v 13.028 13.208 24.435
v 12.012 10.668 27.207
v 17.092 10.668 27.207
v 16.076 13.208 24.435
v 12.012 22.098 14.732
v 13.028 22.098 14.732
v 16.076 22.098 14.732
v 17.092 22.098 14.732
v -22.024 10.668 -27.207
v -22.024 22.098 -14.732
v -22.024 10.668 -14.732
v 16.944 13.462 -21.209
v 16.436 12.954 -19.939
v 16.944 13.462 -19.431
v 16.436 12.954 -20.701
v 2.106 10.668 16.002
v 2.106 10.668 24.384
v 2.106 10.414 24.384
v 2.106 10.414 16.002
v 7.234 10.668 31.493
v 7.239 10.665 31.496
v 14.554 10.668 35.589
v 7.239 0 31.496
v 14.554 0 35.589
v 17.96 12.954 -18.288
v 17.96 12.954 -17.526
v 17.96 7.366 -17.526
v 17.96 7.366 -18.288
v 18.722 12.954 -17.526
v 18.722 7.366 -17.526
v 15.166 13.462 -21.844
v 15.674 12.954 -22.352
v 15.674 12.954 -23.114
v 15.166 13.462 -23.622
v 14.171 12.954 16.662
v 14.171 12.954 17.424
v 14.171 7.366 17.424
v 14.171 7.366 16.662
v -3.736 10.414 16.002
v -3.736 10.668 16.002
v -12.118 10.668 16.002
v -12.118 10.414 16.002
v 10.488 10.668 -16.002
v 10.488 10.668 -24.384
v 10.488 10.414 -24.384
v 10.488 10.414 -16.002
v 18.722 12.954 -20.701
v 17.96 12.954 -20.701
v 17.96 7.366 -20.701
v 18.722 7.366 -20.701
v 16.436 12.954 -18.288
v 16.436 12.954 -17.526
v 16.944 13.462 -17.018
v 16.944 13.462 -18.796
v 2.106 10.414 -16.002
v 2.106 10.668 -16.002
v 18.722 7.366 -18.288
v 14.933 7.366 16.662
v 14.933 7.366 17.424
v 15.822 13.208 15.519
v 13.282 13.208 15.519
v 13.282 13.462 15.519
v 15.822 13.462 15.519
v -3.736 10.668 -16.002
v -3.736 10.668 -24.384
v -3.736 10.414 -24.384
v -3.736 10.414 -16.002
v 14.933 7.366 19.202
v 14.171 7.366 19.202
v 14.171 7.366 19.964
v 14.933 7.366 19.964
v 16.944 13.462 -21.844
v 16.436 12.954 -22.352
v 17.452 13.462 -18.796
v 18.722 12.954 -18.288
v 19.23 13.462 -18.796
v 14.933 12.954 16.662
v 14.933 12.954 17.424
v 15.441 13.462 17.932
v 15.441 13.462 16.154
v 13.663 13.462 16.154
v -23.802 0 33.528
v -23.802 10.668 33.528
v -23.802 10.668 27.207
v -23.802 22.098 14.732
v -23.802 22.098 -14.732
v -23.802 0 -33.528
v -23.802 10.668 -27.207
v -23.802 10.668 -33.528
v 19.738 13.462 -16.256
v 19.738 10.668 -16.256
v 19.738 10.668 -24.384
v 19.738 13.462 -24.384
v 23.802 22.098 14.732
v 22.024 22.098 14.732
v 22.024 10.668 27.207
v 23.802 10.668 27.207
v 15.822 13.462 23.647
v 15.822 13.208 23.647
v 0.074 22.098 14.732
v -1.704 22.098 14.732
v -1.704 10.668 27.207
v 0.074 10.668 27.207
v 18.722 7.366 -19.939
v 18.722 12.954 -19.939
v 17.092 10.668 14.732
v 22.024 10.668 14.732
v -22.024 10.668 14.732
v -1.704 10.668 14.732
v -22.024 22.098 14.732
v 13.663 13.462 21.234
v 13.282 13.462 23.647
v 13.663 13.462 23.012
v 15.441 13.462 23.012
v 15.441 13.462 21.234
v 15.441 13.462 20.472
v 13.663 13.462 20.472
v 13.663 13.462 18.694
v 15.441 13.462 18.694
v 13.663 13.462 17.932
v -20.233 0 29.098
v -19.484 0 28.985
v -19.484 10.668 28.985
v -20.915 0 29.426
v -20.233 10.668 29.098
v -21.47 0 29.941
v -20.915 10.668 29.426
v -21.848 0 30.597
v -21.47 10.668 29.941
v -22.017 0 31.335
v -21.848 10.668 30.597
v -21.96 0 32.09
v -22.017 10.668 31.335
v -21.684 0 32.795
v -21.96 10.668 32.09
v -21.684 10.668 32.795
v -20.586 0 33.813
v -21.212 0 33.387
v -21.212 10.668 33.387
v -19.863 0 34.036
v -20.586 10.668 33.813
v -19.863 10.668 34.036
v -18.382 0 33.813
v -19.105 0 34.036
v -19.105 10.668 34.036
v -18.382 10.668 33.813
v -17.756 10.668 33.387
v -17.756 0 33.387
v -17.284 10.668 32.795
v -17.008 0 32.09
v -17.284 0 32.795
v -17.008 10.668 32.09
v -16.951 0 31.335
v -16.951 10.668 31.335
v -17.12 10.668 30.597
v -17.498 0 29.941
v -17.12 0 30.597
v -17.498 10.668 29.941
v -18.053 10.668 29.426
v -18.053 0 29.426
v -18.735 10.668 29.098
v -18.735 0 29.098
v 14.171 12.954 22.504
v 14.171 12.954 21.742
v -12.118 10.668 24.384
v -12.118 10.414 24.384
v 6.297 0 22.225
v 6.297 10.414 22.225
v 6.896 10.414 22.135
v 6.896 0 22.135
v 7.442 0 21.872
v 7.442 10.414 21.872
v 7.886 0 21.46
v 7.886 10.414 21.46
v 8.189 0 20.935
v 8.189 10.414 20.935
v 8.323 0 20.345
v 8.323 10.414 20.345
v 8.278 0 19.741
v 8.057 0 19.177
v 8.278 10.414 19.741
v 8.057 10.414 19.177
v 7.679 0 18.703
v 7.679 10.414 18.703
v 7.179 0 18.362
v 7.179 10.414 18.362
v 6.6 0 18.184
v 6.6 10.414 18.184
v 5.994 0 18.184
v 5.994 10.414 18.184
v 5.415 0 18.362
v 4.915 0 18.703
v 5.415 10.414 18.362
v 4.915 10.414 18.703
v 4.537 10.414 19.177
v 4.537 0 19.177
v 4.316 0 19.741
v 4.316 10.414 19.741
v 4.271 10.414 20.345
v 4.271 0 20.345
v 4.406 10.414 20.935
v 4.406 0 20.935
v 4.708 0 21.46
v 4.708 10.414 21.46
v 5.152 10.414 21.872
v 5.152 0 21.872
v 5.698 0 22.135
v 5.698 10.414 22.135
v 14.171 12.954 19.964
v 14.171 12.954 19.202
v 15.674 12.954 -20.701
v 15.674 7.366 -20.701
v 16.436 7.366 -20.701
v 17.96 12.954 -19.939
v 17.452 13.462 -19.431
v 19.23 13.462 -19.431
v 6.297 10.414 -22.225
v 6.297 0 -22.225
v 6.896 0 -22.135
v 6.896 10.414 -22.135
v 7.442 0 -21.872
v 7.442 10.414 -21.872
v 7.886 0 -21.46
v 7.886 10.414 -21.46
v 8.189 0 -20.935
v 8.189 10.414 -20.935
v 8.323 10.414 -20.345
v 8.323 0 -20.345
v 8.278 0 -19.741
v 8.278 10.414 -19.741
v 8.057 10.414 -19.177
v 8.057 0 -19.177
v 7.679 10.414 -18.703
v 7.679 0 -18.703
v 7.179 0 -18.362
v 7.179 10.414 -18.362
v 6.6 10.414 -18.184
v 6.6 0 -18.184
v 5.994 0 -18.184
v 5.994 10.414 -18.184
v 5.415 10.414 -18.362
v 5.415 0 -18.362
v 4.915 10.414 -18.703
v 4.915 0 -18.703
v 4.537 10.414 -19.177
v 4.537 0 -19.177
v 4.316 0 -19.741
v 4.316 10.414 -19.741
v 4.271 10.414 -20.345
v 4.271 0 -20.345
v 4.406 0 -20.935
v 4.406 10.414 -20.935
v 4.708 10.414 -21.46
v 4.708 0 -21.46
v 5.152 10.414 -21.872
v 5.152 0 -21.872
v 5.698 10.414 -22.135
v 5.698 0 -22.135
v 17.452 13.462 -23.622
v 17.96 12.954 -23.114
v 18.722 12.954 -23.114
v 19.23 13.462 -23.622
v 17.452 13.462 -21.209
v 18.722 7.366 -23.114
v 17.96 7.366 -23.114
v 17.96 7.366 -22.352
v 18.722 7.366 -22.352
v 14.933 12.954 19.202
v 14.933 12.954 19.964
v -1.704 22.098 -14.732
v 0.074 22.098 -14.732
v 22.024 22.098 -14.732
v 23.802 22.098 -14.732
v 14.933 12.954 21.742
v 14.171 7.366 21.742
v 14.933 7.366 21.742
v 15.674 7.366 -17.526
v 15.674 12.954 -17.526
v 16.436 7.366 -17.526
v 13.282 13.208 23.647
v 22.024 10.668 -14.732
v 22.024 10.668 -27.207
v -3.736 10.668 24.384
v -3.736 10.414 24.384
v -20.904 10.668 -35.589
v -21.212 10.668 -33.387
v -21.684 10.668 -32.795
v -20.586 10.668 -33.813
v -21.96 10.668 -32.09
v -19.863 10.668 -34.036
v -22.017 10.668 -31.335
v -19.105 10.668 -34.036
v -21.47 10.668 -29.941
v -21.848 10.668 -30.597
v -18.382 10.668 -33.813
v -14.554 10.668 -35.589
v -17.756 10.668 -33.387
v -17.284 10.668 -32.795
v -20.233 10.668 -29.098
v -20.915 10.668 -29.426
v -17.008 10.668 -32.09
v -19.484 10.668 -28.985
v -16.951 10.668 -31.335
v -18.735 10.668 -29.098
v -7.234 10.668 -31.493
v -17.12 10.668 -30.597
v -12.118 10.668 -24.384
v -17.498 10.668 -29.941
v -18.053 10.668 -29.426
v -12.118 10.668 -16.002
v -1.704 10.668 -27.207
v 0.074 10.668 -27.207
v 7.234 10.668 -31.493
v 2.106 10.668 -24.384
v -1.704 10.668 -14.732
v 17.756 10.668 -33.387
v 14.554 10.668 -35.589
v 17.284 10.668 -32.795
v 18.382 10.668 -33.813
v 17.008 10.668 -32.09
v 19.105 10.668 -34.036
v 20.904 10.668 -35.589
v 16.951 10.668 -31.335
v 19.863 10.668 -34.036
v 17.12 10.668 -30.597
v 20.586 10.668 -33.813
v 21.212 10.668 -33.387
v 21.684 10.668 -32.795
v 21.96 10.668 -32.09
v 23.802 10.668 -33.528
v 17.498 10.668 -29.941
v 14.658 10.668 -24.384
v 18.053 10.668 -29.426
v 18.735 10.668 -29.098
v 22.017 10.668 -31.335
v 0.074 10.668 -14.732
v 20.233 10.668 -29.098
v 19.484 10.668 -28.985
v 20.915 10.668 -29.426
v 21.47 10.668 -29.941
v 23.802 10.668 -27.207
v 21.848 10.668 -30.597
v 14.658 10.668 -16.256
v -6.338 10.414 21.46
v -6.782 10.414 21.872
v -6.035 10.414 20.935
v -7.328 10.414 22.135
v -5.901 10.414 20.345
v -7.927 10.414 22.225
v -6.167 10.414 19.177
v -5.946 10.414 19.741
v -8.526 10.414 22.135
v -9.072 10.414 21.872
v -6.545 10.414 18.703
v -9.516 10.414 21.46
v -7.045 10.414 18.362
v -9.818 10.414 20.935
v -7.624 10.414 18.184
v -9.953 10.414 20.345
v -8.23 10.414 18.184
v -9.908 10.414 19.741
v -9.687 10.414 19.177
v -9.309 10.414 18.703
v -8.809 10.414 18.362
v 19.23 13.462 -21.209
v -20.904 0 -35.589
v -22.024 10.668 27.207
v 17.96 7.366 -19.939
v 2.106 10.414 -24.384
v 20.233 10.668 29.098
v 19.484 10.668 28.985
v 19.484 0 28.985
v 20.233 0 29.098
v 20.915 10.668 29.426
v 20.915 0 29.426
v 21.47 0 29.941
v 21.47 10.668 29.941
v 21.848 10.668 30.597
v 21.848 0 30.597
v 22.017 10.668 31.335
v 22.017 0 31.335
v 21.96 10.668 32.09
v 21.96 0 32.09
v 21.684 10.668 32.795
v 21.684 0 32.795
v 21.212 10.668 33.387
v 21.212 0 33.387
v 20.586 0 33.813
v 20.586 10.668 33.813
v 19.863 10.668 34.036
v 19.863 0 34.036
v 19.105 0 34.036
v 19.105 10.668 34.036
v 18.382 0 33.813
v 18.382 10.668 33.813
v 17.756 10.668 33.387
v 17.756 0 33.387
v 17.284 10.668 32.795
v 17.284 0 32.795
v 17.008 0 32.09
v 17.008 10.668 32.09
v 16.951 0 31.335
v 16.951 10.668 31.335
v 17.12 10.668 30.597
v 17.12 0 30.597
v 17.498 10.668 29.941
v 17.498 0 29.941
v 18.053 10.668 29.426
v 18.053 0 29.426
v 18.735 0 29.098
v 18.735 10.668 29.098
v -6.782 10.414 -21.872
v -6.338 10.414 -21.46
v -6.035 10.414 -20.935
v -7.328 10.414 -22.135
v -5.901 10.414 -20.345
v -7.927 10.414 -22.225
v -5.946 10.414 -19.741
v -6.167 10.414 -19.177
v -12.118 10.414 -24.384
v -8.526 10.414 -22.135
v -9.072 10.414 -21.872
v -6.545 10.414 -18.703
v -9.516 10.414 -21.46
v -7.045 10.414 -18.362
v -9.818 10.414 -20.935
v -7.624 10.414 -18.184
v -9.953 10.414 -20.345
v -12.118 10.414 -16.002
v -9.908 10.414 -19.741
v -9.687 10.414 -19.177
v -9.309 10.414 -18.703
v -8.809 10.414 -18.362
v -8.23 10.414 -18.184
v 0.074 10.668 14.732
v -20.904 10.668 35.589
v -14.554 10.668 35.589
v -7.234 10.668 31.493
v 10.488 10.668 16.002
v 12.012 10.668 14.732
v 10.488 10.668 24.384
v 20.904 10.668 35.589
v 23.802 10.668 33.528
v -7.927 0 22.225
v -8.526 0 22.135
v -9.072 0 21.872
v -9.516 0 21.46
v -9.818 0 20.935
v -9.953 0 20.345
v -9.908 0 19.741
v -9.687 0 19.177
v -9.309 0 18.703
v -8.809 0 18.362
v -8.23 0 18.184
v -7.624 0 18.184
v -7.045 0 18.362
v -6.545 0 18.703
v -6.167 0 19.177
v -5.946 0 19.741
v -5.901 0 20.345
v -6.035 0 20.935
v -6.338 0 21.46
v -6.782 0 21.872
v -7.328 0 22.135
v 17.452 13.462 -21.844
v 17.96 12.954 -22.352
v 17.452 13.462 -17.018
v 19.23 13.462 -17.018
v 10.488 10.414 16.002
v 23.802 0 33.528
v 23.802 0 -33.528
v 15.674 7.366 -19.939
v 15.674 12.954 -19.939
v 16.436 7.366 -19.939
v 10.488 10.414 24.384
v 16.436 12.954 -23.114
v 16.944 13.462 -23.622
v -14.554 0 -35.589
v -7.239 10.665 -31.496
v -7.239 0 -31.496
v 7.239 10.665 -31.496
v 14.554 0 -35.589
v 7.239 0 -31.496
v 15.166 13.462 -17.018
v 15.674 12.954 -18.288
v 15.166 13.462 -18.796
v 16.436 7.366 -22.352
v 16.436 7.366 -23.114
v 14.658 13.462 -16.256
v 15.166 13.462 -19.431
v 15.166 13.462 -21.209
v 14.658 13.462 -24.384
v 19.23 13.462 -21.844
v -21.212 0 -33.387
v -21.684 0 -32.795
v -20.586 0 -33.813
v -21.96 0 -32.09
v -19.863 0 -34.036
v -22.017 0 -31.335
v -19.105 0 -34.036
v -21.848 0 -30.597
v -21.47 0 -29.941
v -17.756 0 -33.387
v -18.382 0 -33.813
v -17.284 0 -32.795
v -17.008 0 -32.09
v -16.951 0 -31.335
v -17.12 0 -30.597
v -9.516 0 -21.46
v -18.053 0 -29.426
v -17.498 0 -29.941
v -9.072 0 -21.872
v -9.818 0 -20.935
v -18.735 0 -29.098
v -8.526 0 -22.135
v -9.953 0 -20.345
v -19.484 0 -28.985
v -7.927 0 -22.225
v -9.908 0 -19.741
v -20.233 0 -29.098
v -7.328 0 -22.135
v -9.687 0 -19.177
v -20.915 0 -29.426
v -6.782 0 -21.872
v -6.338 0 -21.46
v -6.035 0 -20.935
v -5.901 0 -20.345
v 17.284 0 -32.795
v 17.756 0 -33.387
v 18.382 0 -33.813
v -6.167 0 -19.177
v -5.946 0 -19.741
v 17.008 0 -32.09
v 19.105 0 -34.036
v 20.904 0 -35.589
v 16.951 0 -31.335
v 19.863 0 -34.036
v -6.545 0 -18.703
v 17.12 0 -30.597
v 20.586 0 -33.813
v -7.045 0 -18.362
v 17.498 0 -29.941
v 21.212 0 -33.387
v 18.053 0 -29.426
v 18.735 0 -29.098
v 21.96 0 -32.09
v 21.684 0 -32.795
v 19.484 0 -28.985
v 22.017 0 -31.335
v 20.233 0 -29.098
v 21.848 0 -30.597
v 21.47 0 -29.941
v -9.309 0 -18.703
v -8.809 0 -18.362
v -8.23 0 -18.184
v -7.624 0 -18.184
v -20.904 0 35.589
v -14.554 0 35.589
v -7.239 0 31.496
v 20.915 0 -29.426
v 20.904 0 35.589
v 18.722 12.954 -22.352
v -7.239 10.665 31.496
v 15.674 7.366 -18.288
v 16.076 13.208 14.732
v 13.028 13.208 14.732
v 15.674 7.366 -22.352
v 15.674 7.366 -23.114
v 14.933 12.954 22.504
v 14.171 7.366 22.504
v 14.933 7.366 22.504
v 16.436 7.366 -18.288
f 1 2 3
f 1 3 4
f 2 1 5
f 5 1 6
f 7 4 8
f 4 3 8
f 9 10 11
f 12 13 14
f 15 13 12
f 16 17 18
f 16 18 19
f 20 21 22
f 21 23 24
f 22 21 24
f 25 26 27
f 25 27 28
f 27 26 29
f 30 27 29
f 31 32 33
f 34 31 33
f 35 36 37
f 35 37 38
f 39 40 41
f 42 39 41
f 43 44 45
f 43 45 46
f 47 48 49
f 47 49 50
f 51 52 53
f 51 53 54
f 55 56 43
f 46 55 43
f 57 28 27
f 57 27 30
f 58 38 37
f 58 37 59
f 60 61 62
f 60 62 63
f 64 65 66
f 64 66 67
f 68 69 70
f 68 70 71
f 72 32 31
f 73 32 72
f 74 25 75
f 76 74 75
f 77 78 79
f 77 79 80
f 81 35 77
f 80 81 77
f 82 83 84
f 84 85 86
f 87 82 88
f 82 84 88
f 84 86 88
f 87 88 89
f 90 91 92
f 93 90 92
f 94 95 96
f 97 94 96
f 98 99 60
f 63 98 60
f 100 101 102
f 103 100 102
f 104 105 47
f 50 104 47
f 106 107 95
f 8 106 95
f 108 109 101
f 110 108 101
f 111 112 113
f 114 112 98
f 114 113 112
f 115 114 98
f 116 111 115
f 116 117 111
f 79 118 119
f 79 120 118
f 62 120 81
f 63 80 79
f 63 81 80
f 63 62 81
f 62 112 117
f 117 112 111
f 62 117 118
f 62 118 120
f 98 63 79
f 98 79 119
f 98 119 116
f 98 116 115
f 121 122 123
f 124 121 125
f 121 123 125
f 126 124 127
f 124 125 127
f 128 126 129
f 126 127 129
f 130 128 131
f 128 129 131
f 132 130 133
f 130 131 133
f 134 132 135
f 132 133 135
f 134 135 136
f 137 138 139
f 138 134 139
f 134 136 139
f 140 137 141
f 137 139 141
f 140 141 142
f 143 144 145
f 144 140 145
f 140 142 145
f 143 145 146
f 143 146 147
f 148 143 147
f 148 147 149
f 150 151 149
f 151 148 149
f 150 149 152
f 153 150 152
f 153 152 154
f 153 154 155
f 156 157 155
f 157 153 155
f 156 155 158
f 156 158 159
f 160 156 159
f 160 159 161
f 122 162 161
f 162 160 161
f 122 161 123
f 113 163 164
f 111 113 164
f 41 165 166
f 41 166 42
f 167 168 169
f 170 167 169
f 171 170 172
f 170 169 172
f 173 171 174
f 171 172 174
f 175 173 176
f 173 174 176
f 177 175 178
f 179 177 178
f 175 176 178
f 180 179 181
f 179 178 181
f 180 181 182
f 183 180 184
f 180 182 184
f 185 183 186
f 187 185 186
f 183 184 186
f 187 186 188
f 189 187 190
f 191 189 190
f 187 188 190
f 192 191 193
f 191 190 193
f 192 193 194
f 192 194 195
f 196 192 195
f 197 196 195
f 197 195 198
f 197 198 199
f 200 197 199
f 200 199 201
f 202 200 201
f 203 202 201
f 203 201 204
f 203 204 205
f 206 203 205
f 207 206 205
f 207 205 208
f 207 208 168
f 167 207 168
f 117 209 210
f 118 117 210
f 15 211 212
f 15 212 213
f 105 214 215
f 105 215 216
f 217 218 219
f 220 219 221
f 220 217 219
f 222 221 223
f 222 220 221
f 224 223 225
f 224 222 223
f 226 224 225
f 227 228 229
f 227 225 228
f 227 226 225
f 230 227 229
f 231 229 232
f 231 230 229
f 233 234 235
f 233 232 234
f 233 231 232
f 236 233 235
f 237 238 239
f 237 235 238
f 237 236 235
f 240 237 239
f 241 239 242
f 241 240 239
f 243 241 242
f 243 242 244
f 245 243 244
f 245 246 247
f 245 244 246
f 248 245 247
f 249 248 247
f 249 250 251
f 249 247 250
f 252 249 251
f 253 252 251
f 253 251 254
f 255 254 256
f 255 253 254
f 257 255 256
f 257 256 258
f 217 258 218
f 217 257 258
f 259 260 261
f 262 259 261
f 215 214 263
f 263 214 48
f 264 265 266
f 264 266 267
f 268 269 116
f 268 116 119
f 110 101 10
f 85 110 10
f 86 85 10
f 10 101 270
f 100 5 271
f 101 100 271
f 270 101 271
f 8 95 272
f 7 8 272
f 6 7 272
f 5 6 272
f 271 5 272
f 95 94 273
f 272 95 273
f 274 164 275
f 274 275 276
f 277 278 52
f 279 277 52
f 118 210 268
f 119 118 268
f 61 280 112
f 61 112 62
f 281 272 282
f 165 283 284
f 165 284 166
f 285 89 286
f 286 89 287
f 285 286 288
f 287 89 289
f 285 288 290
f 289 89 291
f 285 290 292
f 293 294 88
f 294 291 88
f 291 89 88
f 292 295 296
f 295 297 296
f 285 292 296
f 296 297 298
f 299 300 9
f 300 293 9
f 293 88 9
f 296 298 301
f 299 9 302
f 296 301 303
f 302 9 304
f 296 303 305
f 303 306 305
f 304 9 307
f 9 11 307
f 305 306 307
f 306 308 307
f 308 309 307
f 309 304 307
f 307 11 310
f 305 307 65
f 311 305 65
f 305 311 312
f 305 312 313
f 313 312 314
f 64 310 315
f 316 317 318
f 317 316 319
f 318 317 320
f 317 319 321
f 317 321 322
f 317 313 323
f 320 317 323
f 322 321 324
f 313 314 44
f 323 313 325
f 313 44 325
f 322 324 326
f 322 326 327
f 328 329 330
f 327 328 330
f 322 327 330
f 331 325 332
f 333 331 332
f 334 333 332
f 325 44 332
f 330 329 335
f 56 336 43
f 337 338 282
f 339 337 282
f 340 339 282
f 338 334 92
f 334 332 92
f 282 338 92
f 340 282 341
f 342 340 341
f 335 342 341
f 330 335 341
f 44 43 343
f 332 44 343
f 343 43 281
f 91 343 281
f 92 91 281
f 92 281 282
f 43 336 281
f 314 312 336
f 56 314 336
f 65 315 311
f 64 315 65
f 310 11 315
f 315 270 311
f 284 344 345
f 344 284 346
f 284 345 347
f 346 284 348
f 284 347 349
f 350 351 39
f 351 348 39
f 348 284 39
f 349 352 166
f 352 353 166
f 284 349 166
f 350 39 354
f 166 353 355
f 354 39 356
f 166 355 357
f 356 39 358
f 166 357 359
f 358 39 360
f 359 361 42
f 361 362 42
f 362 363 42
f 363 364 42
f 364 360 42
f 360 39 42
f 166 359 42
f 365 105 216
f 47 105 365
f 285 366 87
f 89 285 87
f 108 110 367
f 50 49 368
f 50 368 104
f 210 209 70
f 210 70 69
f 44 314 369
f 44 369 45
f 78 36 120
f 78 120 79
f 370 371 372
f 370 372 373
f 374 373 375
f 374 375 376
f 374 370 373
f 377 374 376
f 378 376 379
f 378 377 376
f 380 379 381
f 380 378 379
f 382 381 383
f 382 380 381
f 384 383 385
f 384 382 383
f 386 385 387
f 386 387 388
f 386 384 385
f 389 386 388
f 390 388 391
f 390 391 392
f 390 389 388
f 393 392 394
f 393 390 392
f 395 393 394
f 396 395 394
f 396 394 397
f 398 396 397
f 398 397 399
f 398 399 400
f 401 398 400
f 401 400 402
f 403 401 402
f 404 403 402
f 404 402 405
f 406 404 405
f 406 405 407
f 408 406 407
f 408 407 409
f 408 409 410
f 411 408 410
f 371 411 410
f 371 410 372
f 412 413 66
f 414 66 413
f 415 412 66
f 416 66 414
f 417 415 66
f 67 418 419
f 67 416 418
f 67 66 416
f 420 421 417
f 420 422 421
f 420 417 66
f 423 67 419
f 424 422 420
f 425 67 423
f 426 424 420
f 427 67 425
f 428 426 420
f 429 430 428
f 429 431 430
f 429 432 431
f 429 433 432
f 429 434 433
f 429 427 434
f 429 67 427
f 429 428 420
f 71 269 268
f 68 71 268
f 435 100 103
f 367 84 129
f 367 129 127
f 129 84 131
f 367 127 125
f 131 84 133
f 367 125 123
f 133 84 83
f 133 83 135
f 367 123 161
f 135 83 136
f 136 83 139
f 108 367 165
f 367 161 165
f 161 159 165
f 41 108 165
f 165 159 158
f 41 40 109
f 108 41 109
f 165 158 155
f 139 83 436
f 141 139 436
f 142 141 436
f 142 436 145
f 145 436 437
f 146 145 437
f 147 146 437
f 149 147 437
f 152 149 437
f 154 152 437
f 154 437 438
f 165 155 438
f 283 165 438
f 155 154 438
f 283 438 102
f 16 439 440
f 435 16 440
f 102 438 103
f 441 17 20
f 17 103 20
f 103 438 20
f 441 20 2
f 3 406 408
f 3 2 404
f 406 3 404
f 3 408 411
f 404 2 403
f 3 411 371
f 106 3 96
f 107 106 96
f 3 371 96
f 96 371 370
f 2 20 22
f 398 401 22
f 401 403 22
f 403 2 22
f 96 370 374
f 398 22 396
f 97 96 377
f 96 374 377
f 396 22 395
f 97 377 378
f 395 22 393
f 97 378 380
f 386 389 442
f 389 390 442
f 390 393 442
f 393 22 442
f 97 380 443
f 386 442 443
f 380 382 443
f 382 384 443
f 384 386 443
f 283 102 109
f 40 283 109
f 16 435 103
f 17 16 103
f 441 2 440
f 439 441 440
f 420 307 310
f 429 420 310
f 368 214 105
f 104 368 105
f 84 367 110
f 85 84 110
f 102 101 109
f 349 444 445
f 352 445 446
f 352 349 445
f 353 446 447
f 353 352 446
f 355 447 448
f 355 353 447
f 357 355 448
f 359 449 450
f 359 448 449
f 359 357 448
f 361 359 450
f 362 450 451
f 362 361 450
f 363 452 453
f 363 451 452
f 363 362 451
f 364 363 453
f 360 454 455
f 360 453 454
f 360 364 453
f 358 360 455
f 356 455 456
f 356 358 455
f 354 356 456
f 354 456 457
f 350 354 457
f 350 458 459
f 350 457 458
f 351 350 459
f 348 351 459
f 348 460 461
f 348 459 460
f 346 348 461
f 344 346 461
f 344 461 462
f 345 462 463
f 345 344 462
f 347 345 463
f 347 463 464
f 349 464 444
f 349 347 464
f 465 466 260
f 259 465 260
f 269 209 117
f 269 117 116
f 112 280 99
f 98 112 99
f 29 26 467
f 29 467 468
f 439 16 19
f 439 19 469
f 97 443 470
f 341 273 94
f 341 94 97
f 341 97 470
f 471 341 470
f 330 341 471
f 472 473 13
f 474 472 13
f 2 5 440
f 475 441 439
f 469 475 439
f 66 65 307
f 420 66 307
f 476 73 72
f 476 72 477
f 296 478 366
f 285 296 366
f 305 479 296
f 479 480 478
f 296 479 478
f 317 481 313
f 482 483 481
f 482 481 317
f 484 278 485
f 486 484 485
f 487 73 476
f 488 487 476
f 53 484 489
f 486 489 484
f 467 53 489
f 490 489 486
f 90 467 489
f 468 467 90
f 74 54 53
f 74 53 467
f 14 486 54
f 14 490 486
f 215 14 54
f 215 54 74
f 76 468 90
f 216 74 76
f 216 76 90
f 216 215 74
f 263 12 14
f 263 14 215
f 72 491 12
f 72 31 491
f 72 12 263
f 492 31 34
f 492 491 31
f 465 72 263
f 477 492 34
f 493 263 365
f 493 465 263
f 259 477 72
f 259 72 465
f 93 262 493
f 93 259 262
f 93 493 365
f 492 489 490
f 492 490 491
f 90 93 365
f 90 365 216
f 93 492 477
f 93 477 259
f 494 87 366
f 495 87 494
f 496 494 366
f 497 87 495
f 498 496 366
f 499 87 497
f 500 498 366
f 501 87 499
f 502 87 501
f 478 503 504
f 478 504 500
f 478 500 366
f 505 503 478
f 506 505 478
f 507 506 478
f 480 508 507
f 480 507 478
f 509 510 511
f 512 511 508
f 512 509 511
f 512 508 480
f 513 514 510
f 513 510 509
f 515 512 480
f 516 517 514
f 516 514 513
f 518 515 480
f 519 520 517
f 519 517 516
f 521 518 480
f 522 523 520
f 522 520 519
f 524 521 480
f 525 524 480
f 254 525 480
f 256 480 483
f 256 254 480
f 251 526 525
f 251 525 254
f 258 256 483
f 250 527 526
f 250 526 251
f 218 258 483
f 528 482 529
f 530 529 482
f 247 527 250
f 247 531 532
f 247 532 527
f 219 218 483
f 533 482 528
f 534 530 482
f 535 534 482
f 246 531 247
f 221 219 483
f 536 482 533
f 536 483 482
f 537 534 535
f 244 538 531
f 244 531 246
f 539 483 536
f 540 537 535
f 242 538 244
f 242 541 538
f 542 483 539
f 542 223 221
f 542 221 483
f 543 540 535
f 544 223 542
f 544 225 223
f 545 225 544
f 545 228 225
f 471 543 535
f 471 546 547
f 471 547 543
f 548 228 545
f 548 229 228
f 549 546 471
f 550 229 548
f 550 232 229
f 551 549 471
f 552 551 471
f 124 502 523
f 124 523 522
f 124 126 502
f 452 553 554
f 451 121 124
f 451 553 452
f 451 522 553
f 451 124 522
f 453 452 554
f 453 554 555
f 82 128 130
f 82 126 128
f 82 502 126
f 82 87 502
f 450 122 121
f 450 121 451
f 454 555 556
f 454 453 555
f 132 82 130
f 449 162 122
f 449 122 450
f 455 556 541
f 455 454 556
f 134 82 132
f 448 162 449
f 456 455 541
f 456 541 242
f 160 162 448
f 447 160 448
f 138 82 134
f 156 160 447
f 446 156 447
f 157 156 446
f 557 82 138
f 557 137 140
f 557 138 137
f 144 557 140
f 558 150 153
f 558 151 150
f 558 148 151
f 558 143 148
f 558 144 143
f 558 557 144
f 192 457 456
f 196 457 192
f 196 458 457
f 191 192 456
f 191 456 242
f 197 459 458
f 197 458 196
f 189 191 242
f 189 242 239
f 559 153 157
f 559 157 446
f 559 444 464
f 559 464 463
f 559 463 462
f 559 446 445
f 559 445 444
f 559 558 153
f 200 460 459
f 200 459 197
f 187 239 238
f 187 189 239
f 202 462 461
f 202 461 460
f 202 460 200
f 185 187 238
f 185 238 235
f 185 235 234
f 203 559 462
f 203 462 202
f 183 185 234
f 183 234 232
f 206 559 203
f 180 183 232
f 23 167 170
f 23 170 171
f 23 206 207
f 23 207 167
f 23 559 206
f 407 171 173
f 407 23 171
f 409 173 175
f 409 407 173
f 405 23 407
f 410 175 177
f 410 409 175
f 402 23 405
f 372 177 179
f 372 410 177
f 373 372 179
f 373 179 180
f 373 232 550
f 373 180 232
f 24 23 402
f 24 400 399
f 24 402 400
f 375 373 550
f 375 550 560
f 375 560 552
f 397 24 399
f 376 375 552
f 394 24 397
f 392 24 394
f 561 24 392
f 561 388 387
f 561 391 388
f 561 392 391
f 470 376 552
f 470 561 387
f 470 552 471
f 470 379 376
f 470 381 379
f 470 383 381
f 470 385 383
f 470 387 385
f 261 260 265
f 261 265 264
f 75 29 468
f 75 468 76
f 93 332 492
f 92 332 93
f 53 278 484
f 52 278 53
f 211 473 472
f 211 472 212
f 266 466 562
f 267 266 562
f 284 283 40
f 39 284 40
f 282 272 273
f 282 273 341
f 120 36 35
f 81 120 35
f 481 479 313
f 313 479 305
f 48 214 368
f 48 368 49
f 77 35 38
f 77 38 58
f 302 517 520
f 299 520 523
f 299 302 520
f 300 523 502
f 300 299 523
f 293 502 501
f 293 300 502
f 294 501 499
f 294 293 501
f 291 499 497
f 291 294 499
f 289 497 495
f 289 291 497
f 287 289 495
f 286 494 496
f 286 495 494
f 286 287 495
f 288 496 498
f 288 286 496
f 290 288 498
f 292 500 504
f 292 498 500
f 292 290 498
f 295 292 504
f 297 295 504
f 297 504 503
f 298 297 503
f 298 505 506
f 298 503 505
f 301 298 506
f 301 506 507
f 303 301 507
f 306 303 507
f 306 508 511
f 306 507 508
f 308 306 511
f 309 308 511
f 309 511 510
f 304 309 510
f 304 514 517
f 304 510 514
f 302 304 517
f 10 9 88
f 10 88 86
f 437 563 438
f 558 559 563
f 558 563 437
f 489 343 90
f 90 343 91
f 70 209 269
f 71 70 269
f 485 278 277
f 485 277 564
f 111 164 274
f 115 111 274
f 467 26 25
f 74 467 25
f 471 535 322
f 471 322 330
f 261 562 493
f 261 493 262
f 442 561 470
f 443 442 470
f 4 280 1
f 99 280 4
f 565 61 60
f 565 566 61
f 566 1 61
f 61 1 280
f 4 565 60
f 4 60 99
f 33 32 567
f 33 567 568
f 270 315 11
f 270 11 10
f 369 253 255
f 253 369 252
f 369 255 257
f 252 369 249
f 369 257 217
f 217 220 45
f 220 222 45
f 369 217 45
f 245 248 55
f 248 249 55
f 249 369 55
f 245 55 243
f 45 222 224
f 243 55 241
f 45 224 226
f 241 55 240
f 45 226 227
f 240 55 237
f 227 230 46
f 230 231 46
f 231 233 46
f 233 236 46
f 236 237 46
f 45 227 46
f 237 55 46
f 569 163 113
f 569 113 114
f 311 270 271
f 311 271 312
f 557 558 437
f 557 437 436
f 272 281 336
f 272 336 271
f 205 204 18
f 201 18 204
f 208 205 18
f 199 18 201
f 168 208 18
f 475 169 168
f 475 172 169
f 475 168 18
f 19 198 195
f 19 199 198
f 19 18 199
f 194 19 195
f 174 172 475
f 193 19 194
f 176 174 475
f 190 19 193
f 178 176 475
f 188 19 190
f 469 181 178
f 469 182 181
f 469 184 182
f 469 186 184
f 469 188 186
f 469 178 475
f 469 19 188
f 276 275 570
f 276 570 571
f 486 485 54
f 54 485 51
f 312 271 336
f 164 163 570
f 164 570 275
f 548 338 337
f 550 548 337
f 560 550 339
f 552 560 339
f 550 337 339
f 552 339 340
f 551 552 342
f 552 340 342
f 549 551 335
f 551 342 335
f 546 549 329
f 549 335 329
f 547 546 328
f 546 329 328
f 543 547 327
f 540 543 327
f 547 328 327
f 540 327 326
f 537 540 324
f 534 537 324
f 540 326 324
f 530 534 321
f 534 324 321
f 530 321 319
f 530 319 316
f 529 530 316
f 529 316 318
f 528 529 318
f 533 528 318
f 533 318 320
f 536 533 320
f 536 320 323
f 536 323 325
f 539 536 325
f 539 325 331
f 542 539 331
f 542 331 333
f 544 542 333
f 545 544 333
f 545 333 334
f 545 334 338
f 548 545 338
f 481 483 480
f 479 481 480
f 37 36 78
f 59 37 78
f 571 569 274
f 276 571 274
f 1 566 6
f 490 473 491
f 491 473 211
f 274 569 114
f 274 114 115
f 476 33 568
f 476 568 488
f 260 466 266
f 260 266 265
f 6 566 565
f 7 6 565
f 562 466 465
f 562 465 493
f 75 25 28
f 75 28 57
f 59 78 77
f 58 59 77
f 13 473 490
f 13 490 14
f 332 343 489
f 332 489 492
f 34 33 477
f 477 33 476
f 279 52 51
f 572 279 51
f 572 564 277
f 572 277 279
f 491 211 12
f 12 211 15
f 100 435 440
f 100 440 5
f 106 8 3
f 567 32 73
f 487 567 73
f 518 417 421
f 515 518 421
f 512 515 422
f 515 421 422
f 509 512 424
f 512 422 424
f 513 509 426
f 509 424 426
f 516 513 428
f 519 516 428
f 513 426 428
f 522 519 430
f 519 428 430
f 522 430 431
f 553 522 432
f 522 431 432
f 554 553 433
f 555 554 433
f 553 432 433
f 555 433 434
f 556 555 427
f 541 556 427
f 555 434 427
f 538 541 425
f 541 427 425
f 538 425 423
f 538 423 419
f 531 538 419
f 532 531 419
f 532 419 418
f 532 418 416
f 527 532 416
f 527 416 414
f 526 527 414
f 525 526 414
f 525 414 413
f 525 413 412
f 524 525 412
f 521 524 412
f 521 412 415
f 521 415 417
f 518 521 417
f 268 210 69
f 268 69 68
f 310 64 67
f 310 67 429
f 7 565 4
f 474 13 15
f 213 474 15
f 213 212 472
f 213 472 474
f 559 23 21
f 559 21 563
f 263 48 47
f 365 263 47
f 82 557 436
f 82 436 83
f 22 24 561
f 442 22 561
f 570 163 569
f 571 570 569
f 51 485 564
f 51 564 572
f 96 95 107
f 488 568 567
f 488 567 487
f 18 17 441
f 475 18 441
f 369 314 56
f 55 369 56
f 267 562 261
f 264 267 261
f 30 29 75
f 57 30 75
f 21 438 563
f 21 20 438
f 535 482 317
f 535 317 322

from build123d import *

# Parameters (mm, degrees)
BOSS_EXTRUDE1_DEPTH        = 10.668
SKETCH3_R                  = 2.54
CUT_EXTRUDE1_DEPTH         = 45.123624398
CHAMFER1_SIZE              = 0.00254
SKETCH4_W                  = 29.464
SKETCH4_H                  = 11.43
BOSS_EXTRUDE2_DEPTH        = 47.603865979
RIB1_REACH                 = 51.045
SKETCH5_WALL_W             = 117.009615236
SKETCH5_WALL_H             = 1.778
RIB2_REACH                 = 65.411
SKETCH6_WALL_W             = 145.742114112
SKETCH6_WALL_H             = 1.778
RIB3_START                 = -1.778
RIB3_DEPTH                 = 1.778
RIB4_START                 = -5.08
RIB4_DEPTH                 = 5.08
SKETCH9_W                  = 3.048
SKETCH9_H                  = 8.89
CUT_EXTRUDE2_DEPTH         = 60.891794651
SKETCH13_W                 = 2.54
SKETCH13_H                 = 8.128
BOSS_EXTRUDE3_DEPTH        = 0.254
SKETCH14_W                 = 0.762
SKETCH14_H                 = 0.762
CUT_EXTRUDE4_DEPTH         = 6.096
CHAMFER2_SIZE              = 0.508
LPATTERN1_COUNT            = 3
LPATTERN1_PITCH            = 2.54
CHAMFER2_OF_LPATTERN1_SIZE = 0.508
SKETCH15_W                 = 5.08
SKETCH15_H                 = 8.128
BOSS_EXTRUDE4_DEPTH        = 2.794
SKETCH16_W                 = 0.762
SKETCH16_H                 = 0.762
CUT_EXTRUDE5_DEPTH         = 6.096
CHAMFER3_SIZE              = 0.508
LPATTERN2_COUNT            = 3
LPATTERN2_PITCH            = 2.413
LPATTERN2_COUNT_DIR2       = 2
LPATTERN2_PITCH_DIR2       = 2.286
CHAMFER3_OF_LPATTERN2_SIZE = 0.508
SKETCH18_W                 = 8.382
SKETCH18_H                 = 8.382
CUT_EXTRUDE6_DEPTH         = 0.254
SKETCH19_R                 = 2.032
CUT_EXTRUDE7_DEPTH         = 45.380219265
MIRROR5_COPY_1_SKETCH_W    = 8.382
MIRROR5_COPY_1_SKETCH_H    = 8.382
MIRROR5_COPY_1_DEPTH       = 0.254
MIRROR5_COPY_2_SKETCH_R    = 2.032
MIRROR5_COPY_2_DEPTH       = 45.380219265


# Read off the part's stored shape, not the designer's step: Rib3, Rib4
with BuildPart() as part:
    # Sketch1 → Boss-Extrude1 (new body)
    with BuildSketch(Plane(origin=(0, 0, 0), x_dir=(1, 0, 0), z_dir=(0, 1, 0))):
        Polygon((0, 31.496), (7.239, 31.496), (14.553894525, 35.588705961), (20.903894525, 35.588705961), (23.801932989, 33.528), (23.801932989, 0), (0, 0), align=None)
    boss_extrude1 = extrude(amount=BOSS_EXTRUDE1_DEPTH)

    # Sketch3 → Cut-Extrude1 (cut, through all)
    with BuildSketch(Plane(origin=(0, 10.668, 0), x_dir=(1, 0, 0), z_dir=(0, 1, 0))):
        with Locations(Location((19.483932989, 31.524705961, 0), (0, 0, 270))):
            Circle(SKETCH3_R)
    cut_extrude1 = extrude(amount=-CUT_EXTRUDE1_DEPTH, mode=Mode.SUBTRACT)

    # Mirror1: Boss-Extrude1, Cut-Extrude1 across plane
    add(boss_extrude1.mirror(Plane(origin=(0, 0, 0), x_dir=(0, 0, 1), z_dir=(1, 0, 0))))
    add(cut_extrude1.mirror(Plane(origin=(0, 0, 0), x_dir=(0, 0, 1), z_dir=(1, 0, 0))), mode=Mode.SUBTRACT)

    # Mirror2: part across plane


with BuildPart() as part_1:
    add(part.part)
    add(part.part.mirror(Plane.XY))

    # Chamfer1
    chamfer1_edges = [part_1.edges().sort_by_distance(p)[0] for p in [
        (0, 10.668, -31.496),
        (0, 10.668, 31.496),
    ]]
    chamfer(chamfer1_edges, length=CHAMFER1_SIZE)

    # Sketch4 → Boss-Extrude2 (add)
    with BuildSketch(Plane(origin=(23.801932989, 0, 0), x_dir=(0, 0, -1), z_dir=(1, 0, 0))):
        with Locations((0, 16.383)):
            Rectangle(SKETCH4_W, SKETCH4_H)
    extrude(amount=-BOSS_EXTRUDE2_DEPTH)

    # Sketch5 wall → Rib1 (add, up to next)
    with BuildSketch(Plane(origin=(-1.703932989, 16.383, 20.96935298), x_dir=(0, -0.675559301544, 0.737305655816), z_dir=(0, -0.737305655816, -0.675559301544)), mode=Mode.PRIVATE) as rib1_sk1:
        with Locations((0, -0.889)):
            Rectangle(SKETCH5_WALL_W, SKETCH5_WALL_H)
    rib1_tool1 = extrude(rib1_sk1.sketch, amount=RIB1_REACH, mode=Mode.PRIVATE) - part_1.part
    rib1 = rib1_tool1.solids().sort_by_distance((-1.703932989, 16.383, 20.96935298))[0]
    add(rib1)

    # Sketch6 wall → Rib2 (add, up to next)
    with BuildSketch(Plane(origin=(23.801932989, 16.383, 20.96935298), x_dir=(0, -0.675559301544, 0.737305655816), z_dir=(0, -0.737305655816, -0.675559301544)), mode=Mode.PRIVATE) as rib2_sk1:
        with Locations((0, 0.889)):
            Rectangle(SKETCH6_WALL_W, SKETCH6_WALL_H)
    rib2_tool1 = extrude(rib2_sk1.sketch, amount=RIB2_REACH, mode=Mode.PRIVATE) - part_1.part
    rib2 = rib2_tool1.solids().sort_by_distance((23.801932989, 16.383, 20.96935298))[0]
    add(rib2)

    # Rib3 outline → Rib3 (add)
    with BuildSketch(Plane.ZY.offset(23.801932989).offset(RIB3_START)):
        Polygon((27.206705961, 10.668), (14.732, 22.098), (14.732, 10.668), align=None)
    rib3 = extrude(amount=RIB3_DEPTH)

    # Rib4 outline → Rib4 (add)
    with BuildSketch(Plane.ZY.offset(-12.012067011).offset(RIB4_START)):
        Polygon((27.206705961, 10.668), (14.732, 22.098), (14.732, 10.668), align=None)
    extrude(amount=RIB4_DEPTH)

    # Sketch9 → Cut-Extrude2 (cut, through all)
    with BuildSketch(Plane.XY.offset(14.732)):
        with Locations((14.552067011, 17.653)):
            Rectangle(SKETCH9_W, SKETCH9_H)
    extrude(amount=CUT_EXTRUDE2_DEPTH, mode=Mode.SUBTRACT)

    # Sketch13 → Boss-Extrude3 (add)
    with BuildSketch(Plane(origin=(0, 13.208, 0), x_dir=(1, 0, 0), z_dir=(0, 1, 0))):
        with Locations((14.552067011, -19.583274541)):
            Rectangle(SKETCH13_W, SKETCH13_H)
    extrude(amount=BOSS_EXTRUDE3_DEPTH)

    # Sketch14 → Cut-Extrude4 (cut)
    with BuildSketch(Plane(origin=(0, 13.462, 0), x_dir=(1, 0, 0), z_dir=(0, 1, 0))):
        with Locations((14.552067011, -17.043274541)):
            Rectangle(SKETCH14_W, SKETCH14_H)
    cut_extrude4 = extrude(amount=-CUT_EXTRUDE4_DEPTH, mode=Mode.SUBTRACT)

    # Chamfer2
    chamfer2_edges = [part_1.edges().sort_by_distance(p)[0] for p in [
        (14.933067011, 13.462, 17.043274541),
        (14.552067011, 13.462, 16.662274541),
        (14.171067011, 13.462, 17.043274541),
        (14.552067011, 13.462, 17.424274541),
    ]]
    chamfer(chamfer2_edges, length=CHAMFER2_SIZE)

    # LPattern1: Cut-Extrude4 ×3
    with Locations(*[(0, 0, i * LPATTERN1_PITCH) for i in range(1, LPATTERN1_COUNT)]):
        add(cut_extrude4, mode=Mode.SUBTRACT)

    # Chamfer2 of LPattern1
    chamfer2_of_lpattern1_edges = [part_1.edges().sort_by_distance(p)[0] for p in [
        (14.933067011, 13.462, 19.583274541),
        (14.552067011, 13.462, 19.202274541),
        (14.171067011, 13.462, 19.583274541),
        (14.552067011, 13.462, 19.964274541),
        (14.933067011, 13.462, 22.123274541),
        (14.552067011, 13.462, 21.742274541),
        (14.171067011, 13.462, 22.123274541),
        (14.552067011, 13.462, 22.504274541),
    ]]
    chamfer(chamfer2_of_lpattern1_edges, length=CHAMFER2_OF_LPATTERN1_SIZE)

    # Mirror3: Rib1, Rib2, Rib3 across plane
    add(rib1.mirror(Plane.XY))
    add(rib2.mirror(Plane.XY))
    add(rib3.mirror(Plane.XY))

    # Sketch15 → Boss-Extrude4 (add)
    with BuildSketch(Plane(origin=(0, 10.668, 0), x_dir=(1, 0, 0), z_dir=(0, 1, 0))):
        with Locations((17.197932989, 20.32)):
            Rectangle(SKETCH15_W, SKETCH15_H)
    extrude(amount=BOSS_EXTRUDE4_DEPTH)

    # Sketch16 → Cut-Extrude5 (cut)
    with BuildSketch(Plane(origin=(0, 13.462, 0), x_dir=(1, 0, 0), z_dir=(0, 1, 0))):
        with Locations((18.340932989, 17.907)):
            Rectangle(SKETCH16_W, SKETCH16_H)
    cut_extrude5 = extrude(amount=-CUT_EXTRUDE5_DEPTH, mode=Mode.SUBTRACT)

    # Chamfer3
    chamfer3_edges = [part_1.edges().sort_by_distance(p)[0] for p in [
        (18.721932989, 13.462, -17.907),
        (18.340932989, 13.462, -18.288),
        (17.959932989, 13.462, -17.907),
        (18.340932989, 13.462, -17.526),
    ]]
    chamfer(chamfer3_edges, length=CHAMFER3_SIZE)

    # LPattern2: Cut-Extrude5 3 × 2
    with Locations(*[(-j * LPATTERN2_PITCH_DIR2, 0, -i * LPATTERN2_PITCH) for i in range(LPATTERN2_COUNT) for j in range(LPATTERN2_COUNT_DIR2) if (i, j) != (0, 0)]):
        add(cut_extrude5, mode=Mode.SUBTRACT)

    # Chamfer3 of LPattern2
    chamfer3_of_lpattern2_edges = [part_1.edges().sort_by_distance(p)[0] for p in [
        (16.435932989, 13.462, -17.907),
        (16.054932989, 13.462, -18.288),
        (15.673932989, 13.462, -17.907),
        (16.054932989, 13.462, -17.526),
        (18.721932989, 13.462, -20.32),
        (18.340932989, 13.462, -20.701),
        (17.959932989, 13.462, -20.32),
        (18.340932989, 13.462, -19.939),
        (16.435932989, 13.462, -20.32),
        (16.054932989, 13.462, -20.701),
        (15.673932989, 13.462, -20.32),
        (16.054932989, 13.462, -19.939),
        (18.721932989, 13.462, -22.733),
        (18.340932989, 13.462, -23.114),
        (17.959932989, 13.462, -22.733),
        (18.340932989, 13.462, -22.352),
        (16.435932989, 13.462, -22.733),
        (16.054932989, 13.462, -23.114),
        (15.673932989, 13.462, -22.733),
        (16.054932989, 13.462, -22.352),
    ]]
    chamfer(chamfer3_of_lpattern2_edges, length=CHAMFER3_OF_LPATTERN2_SIZE)

    # Sketch18 → Cut-Extrude6 (cut)
    with BuildSketch(Plane(origin=(0, 10.668, 0), x_dir=(1, 0, 0), z_dir=(0, 1, 0))):
        with Locations((6.297067011, -20.193)):
            Rectangle(SKETCH18_W, SKETCH18_H)
    cut_extrude6 = extrude(amount=-CUT_EXTRUDE6_DEPTH, mode=Mode.SUBTRACT)

    # Sketch19 → Cut-Extrude7 (cut, through all)
    with BuildSketch(Plane(origin=(0, 10.414, 0), x_dir=(1, 0, 0), z_dir=(0, 1, 0))):
        with Locations(Location((6.297067011, -20.193, 0), (0, 0, 270))):
            Circle(SKETCH19_R)
    cut_extrude7 = extrude(amount=-CUT_EXTRUDE7_DEPTH, mode=Mode.SUBTRACT)

    # Mirror4: Cut-Extrude6, Cut-Extrude7 across plane
    add(cut_extrude6.mirror(Plane.ZY.offset(0.814932989)), mode=Mode.SUBTRACT)
    add(cut_extrude7.mirror(Plane.ZY.offset(0.814932989)), mode=Mode.SUBTRACT)

    # Mirror5: Cut-Extrude6, Cut-Extrude7 across plane
    add(cut_extrude6.mirror(Plane.XY), mode=Mode.SUBTRACT)
    add(cut_extrude7.mirror(Plane.XY), mode=Mode.SUBTRACT)

    # Mirror5 copy 1 sketch → Mirror5 copy 1 (cut)
    with BuildSketch(Plane(origin=(-1.629865979, 10.668, 0), x_dir=(-1, 0, 0), z_dir=(0, 1, 0))):
        with Locations((6.297067011, -20.193)):
            Rectangle(MIRROR5_COPY_1_SKETCH_W, MIRROR5_COPY_1_SKETCH_H)
    extrude(amount=-MIRROR5_COPY_1_DEPTH, mode=Mode.SUBTRACT)

    # Mirror5 copy 2 sketch → Mirror5 copy 2 (cut, through all)
    with BuildSketch(Plane(origin=(-1.629865979, 10.414, 0), x_dir=(-1, 0, 0), z_dir=(0, 1, 0))):
        with Locations(Location((6.297067011, -20.193, 0), (0, 0, 270))):
            Circle(MIRROR5_COPY_2_SKETCH_R)
    extrude(amount=-MIRROR5_COPY_2_DEPTH, mode=Mode.SUBTRACT)


solid = part_1.part
